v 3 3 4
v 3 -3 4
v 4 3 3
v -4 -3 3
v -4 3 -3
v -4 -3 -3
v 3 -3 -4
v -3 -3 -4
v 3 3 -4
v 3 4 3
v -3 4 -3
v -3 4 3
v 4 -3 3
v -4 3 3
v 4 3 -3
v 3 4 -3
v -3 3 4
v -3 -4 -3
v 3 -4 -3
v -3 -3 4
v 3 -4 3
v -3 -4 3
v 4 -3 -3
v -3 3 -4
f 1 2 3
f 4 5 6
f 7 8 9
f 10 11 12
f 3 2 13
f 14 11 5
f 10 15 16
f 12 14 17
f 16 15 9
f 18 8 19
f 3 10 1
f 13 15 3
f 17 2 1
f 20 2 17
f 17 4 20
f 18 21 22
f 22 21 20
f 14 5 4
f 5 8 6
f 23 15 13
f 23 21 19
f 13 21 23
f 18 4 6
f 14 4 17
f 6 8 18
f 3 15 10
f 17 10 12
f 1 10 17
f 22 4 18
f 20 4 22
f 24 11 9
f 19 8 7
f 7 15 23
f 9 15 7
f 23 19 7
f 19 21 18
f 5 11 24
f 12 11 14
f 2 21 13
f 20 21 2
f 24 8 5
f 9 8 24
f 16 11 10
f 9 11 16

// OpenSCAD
// file: ../../mutil.scad
module mcenter(center, _size) {

    assert(is_bool(center) || (is_list(center) && len(center) == 3), "center must be 'bool' or 'array[3]'");

    _translate =
        is_bool(center)
        ? [center ? -_size.x / 2 : 0, center ? -_size.y / 2 : 0, center ? -_size.z / 2 : 0]
        : [((center.x / 2) * _size.x) - (_size.x / 2), ((center.y / 2) * _size.y) - (_size.y / 2), ((center.z / 2) * _size.z) -(_size.z / 2)];

    translate(_translate) {
        children();
    }

}


module mcolor(color) {

    if(is_undef(color)) {
        children();
    } else {
        color(color) {
            children();
        }
    }
}



function mlist3(v) = (
    is_num(v)
        ? [v, v, v]
        : v
);


function mprecision(value, precision) = (
   round(value * pow(10, precision)) /  pow(10, precision)
);


function mm2i(mm) = (
    mm / 25.4
);

function i2mm(i) = (
    i * 25.4
);
// file: ../../mdefaults.scad
inch = 25.4;

default_outside_radius = inch / 4;

default_wall_thickness = inch / 8;

default_chamfer = default_wall_thickness / 4;

default_size = 10;

default_manifold_overlap = 0.01;
// file: ../../mcube.scad
// BOF

// extends: https://en.wikibooks.org/wiki/OpenSCAD_User_Manual/The_OpenSCAD_Language#cube
// cube(size = [x,y,z], center = true/false);
// cube(size =  x ,     center = true/false);

include <mdefaults.scad>;

use <mutil.scad>;

module mcube(size = default_size, center = false, chamfer = undef, color = undef, manifold_underlap = false, manifold_overlap = false) {

    module cubey(cubey_size, _chamfer) {

        if(is_undef(_chamfer) || _chamfer == 0) {
            cube(cubey_size);
        } else {
            hull() {
                translate([cubey_size.x / 2, cubey_size.y / 2, cubey_size.z / 2]) {
                    cube([cubey_size.x               , cubey_size.y - _chamfer * 2, cubey_size.z - _chamfer * 2], center = true); // x axis
                    cube([cubey_size.x - _chamfer * 2, cubey_size.y               , cubey_size.z - _chamfer * 2], center = true); // y axis
                    cube([cubey_size.x - _chamfer * 2, cubey_size.y - _chamfer * 2, cubey_size.z               ], center = true); // z axis
                }
            }
        }
    }

    
    assert(is_num(size) || (is_list(size) && len(size) == 3), "size must be 'num' or 'array[3]'");
    _size = mlist3(size) + mlist3(manifold_overlap ? default_manifold_overlap : 0) - mlist3(manifold_underlap ? default_manifold_overlap : 0);

    mcenter(center, _size) {
        mcolor(color) {
            cubey(_size, _chamfer = chamfer);
        }
    }

}


// test parts
                mcube(  5,         true, chamfer = 1   , color =  "green");
color("pink")   mcube(  [6,6,6]                                          );
                mcube(  5, [-1, -1, -1], chamfer = 1   , color = "orange");
                mcube(4.5,         true, chamfer = 0.25                  );



// EOF
// main file
use <../../mcube.scad>;

mcube([8, 8, 8], center = true, chamfer = 1, color = "green");
